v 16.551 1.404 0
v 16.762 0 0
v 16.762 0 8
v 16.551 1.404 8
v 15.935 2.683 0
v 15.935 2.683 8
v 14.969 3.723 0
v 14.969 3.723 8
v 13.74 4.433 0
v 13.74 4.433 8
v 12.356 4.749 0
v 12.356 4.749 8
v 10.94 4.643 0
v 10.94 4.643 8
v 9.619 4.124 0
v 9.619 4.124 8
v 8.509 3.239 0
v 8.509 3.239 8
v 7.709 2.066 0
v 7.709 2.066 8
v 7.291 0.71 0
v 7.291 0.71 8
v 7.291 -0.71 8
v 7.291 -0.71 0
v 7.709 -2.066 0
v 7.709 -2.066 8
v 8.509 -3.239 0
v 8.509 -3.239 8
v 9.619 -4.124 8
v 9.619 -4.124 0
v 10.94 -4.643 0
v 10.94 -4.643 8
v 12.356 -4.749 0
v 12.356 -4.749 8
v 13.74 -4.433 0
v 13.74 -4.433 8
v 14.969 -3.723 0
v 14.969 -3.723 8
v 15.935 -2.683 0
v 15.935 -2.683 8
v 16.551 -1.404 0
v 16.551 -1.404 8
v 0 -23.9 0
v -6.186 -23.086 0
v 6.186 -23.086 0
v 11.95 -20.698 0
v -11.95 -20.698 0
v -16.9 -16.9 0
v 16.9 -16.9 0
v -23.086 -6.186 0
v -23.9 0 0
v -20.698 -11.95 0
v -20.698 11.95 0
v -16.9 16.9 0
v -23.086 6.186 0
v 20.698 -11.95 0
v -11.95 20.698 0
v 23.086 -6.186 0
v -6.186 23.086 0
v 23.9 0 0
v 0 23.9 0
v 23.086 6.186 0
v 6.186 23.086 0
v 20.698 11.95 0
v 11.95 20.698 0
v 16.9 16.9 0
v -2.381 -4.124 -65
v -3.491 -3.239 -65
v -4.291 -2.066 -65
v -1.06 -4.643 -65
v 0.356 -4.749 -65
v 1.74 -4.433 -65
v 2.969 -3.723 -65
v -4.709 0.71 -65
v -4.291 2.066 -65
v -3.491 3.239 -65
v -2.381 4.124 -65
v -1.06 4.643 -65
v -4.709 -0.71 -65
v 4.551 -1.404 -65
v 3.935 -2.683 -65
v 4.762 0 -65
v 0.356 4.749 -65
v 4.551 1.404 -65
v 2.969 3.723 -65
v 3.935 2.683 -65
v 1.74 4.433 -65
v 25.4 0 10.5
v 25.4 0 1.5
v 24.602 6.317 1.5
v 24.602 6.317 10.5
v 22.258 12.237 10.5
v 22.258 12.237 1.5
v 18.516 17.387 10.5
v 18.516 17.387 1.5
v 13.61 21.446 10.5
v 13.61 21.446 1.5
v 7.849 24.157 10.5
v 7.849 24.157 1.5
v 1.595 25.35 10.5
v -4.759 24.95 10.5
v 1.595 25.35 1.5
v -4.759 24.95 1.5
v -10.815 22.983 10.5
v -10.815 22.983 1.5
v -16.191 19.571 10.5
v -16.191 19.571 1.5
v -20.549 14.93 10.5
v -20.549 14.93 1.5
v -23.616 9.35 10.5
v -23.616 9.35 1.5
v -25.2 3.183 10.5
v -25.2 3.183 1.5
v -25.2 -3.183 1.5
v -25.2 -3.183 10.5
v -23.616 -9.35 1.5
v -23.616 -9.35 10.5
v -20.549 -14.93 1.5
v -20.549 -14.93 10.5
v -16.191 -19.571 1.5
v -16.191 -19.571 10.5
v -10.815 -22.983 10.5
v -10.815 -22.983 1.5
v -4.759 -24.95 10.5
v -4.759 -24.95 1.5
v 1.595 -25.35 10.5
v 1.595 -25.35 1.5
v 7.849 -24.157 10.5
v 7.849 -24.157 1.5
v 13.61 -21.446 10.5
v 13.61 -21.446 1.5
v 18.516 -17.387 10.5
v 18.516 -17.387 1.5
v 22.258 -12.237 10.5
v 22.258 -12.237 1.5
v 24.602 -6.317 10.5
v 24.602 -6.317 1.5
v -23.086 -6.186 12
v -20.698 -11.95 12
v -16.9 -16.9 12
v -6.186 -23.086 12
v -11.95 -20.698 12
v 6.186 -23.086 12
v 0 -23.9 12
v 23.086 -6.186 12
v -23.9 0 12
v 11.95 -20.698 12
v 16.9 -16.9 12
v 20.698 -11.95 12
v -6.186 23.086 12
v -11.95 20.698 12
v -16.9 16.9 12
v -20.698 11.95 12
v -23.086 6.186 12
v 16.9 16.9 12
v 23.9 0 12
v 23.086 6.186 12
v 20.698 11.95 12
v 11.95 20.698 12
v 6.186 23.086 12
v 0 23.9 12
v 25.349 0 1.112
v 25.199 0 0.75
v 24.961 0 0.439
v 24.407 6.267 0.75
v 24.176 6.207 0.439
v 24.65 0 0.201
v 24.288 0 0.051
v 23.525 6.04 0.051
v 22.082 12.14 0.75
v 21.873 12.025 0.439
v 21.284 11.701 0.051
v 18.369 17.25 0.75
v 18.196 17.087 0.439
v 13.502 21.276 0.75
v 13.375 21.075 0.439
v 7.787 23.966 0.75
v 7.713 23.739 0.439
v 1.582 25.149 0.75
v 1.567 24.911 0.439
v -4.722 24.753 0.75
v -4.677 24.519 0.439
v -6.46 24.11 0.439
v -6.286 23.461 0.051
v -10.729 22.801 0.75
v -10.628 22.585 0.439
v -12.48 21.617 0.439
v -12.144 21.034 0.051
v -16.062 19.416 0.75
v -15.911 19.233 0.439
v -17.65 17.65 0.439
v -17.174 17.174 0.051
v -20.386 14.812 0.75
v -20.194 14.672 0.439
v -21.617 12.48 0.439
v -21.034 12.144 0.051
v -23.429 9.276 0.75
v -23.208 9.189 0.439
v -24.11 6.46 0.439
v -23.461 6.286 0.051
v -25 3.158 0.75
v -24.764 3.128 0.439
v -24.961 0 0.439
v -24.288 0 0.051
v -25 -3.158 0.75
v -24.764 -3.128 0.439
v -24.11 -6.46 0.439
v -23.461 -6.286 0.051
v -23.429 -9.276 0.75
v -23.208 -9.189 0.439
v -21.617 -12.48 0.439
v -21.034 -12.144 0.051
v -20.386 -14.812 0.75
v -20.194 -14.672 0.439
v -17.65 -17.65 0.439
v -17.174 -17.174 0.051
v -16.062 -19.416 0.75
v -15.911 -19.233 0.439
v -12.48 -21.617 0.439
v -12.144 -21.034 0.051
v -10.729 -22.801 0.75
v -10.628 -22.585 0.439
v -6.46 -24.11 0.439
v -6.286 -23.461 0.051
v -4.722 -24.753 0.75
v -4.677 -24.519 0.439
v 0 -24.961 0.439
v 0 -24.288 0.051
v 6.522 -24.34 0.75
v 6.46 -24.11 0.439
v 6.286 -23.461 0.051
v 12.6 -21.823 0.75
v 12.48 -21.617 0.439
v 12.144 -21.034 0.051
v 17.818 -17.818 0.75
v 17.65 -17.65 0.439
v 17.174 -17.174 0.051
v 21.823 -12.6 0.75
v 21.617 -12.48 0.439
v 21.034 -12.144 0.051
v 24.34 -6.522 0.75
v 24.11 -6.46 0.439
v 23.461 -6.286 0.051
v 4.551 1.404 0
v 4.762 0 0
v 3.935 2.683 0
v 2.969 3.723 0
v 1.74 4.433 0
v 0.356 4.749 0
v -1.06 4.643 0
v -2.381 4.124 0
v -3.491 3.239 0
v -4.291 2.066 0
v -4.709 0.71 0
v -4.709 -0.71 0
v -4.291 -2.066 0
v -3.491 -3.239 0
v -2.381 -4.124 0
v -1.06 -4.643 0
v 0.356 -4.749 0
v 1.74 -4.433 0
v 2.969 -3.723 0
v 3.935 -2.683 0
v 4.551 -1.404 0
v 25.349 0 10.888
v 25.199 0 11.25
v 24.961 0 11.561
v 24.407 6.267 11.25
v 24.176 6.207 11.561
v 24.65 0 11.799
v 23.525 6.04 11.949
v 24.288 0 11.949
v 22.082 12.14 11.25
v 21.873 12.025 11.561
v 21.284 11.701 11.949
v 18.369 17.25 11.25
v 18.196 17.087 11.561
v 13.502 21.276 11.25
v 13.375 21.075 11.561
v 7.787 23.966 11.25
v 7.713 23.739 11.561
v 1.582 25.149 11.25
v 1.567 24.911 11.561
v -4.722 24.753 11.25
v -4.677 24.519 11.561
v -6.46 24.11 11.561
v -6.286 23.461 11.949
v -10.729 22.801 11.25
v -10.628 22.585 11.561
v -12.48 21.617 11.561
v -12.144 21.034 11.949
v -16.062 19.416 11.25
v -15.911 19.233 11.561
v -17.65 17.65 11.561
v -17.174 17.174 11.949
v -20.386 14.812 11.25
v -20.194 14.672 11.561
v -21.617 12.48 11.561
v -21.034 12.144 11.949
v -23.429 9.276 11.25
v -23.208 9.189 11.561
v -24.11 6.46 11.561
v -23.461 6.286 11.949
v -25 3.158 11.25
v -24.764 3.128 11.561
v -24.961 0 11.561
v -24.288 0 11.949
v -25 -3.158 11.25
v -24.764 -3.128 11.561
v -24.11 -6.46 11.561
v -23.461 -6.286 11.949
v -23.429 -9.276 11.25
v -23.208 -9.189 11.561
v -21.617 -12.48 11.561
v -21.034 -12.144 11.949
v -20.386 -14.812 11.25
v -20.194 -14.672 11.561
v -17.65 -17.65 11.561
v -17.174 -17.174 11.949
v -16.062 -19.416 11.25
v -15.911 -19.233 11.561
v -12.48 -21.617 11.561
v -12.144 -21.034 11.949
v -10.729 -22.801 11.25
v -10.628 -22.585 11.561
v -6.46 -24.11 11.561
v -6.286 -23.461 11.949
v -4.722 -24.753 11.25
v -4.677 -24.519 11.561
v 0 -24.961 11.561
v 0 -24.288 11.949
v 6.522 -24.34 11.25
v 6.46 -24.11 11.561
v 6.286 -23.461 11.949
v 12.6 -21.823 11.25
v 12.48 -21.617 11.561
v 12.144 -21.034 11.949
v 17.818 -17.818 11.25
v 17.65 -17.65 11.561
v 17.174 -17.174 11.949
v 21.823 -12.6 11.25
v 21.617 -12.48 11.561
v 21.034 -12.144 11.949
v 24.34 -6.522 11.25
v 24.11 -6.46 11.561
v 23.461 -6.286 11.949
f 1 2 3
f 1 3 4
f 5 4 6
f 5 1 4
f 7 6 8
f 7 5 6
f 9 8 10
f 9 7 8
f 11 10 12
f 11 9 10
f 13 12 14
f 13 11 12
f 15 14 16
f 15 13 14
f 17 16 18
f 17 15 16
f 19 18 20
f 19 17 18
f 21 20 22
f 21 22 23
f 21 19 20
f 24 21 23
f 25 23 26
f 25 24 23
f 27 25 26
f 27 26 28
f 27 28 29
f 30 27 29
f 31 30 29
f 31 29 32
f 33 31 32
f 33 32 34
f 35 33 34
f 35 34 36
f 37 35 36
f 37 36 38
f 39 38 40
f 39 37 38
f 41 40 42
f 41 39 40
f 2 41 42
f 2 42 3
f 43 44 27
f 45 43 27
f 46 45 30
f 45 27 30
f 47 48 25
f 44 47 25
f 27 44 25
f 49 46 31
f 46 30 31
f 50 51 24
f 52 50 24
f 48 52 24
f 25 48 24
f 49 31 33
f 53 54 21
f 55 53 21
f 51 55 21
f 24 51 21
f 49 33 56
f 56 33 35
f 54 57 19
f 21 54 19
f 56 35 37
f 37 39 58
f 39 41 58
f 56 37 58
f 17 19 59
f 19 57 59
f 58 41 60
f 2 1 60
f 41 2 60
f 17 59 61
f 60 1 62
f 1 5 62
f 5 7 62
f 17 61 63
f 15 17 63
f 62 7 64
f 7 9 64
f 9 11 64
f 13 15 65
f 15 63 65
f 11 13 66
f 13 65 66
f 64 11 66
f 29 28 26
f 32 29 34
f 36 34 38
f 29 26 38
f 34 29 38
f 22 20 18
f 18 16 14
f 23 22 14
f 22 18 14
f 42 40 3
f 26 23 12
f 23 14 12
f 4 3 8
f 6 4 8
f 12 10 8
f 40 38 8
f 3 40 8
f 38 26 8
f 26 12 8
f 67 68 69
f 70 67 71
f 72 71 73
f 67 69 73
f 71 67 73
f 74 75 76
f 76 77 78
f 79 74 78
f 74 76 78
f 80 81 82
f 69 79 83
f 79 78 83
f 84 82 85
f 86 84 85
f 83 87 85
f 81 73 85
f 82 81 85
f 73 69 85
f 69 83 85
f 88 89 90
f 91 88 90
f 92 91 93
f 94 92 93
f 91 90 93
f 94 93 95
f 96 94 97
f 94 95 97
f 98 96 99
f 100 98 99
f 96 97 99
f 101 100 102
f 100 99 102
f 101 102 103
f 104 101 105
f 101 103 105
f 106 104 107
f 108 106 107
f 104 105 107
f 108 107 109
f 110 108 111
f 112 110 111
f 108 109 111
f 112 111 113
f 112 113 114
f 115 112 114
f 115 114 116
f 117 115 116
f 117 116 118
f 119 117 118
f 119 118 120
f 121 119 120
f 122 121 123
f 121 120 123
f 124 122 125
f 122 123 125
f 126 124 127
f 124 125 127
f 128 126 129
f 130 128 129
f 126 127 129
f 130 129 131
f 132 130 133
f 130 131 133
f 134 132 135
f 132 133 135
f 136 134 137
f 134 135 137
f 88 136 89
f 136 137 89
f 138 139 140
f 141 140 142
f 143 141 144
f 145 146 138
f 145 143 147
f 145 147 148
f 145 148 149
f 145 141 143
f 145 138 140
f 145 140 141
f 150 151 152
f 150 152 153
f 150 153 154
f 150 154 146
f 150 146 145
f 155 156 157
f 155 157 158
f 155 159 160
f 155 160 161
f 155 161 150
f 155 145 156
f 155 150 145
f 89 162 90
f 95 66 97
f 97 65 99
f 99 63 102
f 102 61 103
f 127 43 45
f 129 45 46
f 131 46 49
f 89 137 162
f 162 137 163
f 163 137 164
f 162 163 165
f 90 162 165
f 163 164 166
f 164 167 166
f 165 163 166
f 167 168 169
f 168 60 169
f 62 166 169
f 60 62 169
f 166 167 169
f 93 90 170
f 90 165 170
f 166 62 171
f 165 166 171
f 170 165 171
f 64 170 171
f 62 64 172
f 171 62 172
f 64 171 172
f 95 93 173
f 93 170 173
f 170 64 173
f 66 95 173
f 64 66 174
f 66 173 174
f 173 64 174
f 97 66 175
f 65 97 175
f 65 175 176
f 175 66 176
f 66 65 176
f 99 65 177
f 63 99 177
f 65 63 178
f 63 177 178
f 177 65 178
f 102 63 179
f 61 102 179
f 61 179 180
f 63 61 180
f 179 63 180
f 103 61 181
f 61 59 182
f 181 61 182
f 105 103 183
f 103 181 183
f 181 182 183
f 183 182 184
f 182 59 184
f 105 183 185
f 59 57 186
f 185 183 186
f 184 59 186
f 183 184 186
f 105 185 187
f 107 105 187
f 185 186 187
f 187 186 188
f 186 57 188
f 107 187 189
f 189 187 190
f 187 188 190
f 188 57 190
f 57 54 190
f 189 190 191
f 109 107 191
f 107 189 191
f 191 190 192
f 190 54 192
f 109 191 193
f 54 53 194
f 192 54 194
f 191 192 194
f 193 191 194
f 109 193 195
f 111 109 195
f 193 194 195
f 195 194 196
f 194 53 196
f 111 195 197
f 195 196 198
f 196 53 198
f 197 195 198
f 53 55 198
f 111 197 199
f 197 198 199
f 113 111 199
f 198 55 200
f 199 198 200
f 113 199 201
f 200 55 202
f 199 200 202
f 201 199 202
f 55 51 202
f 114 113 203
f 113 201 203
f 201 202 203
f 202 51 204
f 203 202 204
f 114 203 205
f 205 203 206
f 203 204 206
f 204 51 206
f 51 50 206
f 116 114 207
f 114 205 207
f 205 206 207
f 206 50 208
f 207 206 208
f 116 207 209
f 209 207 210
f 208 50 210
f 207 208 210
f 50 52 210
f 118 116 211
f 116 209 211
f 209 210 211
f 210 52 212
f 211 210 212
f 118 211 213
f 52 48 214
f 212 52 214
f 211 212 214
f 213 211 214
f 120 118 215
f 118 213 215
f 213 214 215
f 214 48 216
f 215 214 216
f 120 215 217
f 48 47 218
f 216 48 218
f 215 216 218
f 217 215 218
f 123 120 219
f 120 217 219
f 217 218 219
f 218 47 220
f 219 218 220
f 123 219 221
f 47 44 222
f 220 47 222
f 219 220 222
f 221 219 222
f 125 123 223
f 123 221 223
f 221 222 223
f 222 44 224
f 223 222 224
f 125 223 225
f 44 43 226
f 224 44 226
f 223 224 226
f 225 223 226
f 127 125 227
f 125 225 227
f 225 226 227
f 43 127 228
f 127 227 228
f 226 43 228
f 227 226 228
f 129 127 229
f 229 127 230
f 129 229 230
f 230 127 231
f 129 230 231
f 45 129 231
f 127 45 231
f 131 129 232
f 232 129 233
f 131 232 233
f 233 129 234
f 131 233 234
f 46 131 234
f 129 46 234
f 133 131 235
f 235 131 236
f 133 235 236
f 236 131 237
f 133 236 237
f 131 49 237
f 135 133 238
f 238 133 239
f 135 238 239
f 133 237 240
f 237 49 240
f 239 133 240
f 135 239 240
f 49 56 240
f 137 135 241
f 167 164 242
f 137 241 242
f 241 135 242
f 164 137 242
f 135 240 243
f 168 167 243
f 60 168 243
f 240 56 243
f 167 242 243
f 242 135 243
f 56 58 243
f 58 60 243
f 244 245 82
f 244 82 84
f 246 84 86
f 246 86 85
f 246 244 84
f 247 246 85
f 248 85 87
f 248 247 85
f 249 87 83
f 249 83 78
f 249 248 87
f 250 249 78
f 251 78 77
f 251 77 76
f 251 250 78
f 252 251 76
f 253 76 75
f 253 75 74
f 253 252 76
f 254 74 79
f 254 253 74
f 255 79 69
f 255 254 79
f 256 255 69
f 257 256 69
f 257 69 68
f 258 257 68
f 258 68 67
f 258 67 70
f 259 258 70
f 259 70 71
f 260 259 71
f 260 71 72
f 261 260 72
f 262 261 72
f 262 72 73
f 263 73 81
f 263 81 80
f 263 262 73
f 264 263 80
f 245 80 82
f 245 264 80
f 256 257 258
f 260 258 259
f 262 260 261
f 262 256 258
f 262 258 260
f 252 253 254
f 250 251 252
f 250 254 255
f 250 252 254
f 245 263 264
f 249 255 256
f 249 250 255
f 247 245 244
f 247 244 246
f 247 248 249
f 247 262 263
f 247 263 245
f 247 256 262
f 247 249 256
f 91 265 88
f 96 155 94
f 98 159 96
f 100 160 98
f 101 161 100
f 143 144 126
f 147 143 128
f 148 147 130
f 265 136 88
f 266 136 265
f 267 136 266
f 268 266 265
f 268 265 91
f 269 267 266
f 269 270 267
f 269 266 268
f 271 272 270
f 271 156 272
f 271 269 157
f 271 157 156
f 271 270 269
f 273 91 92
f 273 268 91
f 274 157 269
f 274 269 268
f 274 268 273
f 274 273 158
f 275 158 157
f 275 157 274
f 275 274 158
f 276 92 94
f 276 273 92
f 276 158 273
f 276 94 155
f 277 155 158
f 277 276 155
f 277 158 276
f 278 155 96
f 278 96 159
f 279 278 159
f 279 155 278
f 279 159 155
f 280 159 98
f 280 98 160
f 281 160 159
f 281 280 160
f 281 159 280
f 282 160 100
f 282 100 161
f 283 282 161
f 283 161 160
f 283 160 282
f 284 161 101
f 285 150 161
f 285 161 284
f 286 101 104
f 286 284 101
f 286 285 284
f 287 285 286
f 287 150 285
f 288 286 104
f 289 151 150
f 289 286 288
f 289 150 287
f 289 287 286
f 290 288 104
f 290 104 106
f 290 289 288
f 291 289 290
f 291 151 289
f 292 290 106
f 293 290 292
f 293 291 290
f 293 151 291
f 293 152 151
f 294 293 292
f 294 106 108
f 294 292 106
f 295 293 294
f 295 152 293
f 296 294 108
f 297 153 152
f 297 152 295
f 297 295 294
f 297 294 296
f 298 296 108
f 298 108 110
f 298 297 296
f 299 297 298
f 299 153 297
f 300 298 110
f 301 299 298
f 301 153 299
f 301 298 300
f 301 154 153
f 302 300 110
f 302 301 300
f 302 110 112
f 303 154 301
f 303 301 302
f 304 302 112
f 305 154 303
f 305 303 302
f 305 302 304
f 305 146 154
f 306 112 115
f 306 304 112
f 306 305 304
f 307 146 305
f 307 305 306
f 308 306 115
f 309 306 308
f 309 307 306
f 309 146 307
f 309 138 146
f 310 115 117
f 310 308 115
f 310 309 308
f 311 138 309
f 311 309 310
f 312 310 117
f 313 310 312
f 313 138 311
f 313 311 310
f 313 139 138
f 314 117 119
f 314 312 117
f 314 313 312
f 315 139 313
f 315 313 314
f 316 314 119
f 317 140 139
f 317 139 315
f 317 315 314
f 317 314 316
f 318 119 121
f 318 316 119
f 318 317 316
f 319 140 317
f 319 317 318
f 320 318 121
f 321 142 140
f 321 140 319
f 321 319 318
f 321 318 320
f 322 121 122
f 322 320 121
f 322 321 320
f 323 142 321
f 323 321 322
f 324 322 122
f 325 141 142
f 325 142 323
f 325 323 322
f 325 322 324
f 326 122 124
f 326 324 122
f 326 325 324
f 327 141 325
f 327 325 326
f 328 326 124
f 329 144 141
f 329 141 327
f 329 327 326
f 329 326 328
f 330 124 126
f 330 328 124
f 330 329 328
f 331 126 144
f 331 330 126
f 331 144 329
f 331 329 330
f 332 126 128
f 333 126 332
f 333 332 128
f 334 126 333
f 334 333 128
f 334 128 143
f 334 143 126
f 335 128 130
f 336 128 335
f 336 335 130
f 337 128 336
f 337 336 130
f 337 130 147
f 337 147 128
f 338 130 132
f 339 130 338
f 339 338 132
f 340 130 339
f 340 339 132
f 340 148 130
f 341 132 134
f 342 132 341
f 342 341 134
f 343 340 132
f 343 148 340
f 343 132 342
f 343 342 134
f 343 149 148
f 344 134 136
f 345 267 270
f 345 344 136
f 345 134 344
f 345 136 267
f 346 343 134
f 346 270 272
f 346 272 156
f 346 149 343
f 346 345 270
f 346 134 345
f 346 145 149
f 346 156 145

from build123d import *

# Parameters (mm, degrees)
F0_R     = 25.4
F1_DEPTH = 12
F2_R     = 1.5
F3_R     = 4.7625
F4_DEPTH = 8
F5_R     = 4.7625
F6_DEPTH = 65


with BuildPart() as f1:
    # F0 (on Top) → F1 (new body)
    with BuildSketch(Plane.XY):
        Circle(F0_R)
    extrude(amount=F1_DEPTH)

    # F2
    f2_edges = [f1.edges().sort_by_distance(p)[0] for p in [
        (-25.4, 0, 12),
        (-25.4, 0, 0),
    ]]
    fillet(f2_edges, radius=F2_R)

    # F3 (on Top) → F4 (cut)
    with BuildSketch(Plane.XY):
        with Locations((12, 0)):
            Circle(F3_R)
    extrude(amount=F4_DEPTH, mode=Mode.SUBTRACT)


with BuildPart() as f6:
    # F5 (on Top) → F6 (new body)
    with BuildSketch(Plane.XY):
        Circle(F5_R)
    extrude(amount=-F6_DEPTH)


solid = Compound([f1.part, f6.part])
